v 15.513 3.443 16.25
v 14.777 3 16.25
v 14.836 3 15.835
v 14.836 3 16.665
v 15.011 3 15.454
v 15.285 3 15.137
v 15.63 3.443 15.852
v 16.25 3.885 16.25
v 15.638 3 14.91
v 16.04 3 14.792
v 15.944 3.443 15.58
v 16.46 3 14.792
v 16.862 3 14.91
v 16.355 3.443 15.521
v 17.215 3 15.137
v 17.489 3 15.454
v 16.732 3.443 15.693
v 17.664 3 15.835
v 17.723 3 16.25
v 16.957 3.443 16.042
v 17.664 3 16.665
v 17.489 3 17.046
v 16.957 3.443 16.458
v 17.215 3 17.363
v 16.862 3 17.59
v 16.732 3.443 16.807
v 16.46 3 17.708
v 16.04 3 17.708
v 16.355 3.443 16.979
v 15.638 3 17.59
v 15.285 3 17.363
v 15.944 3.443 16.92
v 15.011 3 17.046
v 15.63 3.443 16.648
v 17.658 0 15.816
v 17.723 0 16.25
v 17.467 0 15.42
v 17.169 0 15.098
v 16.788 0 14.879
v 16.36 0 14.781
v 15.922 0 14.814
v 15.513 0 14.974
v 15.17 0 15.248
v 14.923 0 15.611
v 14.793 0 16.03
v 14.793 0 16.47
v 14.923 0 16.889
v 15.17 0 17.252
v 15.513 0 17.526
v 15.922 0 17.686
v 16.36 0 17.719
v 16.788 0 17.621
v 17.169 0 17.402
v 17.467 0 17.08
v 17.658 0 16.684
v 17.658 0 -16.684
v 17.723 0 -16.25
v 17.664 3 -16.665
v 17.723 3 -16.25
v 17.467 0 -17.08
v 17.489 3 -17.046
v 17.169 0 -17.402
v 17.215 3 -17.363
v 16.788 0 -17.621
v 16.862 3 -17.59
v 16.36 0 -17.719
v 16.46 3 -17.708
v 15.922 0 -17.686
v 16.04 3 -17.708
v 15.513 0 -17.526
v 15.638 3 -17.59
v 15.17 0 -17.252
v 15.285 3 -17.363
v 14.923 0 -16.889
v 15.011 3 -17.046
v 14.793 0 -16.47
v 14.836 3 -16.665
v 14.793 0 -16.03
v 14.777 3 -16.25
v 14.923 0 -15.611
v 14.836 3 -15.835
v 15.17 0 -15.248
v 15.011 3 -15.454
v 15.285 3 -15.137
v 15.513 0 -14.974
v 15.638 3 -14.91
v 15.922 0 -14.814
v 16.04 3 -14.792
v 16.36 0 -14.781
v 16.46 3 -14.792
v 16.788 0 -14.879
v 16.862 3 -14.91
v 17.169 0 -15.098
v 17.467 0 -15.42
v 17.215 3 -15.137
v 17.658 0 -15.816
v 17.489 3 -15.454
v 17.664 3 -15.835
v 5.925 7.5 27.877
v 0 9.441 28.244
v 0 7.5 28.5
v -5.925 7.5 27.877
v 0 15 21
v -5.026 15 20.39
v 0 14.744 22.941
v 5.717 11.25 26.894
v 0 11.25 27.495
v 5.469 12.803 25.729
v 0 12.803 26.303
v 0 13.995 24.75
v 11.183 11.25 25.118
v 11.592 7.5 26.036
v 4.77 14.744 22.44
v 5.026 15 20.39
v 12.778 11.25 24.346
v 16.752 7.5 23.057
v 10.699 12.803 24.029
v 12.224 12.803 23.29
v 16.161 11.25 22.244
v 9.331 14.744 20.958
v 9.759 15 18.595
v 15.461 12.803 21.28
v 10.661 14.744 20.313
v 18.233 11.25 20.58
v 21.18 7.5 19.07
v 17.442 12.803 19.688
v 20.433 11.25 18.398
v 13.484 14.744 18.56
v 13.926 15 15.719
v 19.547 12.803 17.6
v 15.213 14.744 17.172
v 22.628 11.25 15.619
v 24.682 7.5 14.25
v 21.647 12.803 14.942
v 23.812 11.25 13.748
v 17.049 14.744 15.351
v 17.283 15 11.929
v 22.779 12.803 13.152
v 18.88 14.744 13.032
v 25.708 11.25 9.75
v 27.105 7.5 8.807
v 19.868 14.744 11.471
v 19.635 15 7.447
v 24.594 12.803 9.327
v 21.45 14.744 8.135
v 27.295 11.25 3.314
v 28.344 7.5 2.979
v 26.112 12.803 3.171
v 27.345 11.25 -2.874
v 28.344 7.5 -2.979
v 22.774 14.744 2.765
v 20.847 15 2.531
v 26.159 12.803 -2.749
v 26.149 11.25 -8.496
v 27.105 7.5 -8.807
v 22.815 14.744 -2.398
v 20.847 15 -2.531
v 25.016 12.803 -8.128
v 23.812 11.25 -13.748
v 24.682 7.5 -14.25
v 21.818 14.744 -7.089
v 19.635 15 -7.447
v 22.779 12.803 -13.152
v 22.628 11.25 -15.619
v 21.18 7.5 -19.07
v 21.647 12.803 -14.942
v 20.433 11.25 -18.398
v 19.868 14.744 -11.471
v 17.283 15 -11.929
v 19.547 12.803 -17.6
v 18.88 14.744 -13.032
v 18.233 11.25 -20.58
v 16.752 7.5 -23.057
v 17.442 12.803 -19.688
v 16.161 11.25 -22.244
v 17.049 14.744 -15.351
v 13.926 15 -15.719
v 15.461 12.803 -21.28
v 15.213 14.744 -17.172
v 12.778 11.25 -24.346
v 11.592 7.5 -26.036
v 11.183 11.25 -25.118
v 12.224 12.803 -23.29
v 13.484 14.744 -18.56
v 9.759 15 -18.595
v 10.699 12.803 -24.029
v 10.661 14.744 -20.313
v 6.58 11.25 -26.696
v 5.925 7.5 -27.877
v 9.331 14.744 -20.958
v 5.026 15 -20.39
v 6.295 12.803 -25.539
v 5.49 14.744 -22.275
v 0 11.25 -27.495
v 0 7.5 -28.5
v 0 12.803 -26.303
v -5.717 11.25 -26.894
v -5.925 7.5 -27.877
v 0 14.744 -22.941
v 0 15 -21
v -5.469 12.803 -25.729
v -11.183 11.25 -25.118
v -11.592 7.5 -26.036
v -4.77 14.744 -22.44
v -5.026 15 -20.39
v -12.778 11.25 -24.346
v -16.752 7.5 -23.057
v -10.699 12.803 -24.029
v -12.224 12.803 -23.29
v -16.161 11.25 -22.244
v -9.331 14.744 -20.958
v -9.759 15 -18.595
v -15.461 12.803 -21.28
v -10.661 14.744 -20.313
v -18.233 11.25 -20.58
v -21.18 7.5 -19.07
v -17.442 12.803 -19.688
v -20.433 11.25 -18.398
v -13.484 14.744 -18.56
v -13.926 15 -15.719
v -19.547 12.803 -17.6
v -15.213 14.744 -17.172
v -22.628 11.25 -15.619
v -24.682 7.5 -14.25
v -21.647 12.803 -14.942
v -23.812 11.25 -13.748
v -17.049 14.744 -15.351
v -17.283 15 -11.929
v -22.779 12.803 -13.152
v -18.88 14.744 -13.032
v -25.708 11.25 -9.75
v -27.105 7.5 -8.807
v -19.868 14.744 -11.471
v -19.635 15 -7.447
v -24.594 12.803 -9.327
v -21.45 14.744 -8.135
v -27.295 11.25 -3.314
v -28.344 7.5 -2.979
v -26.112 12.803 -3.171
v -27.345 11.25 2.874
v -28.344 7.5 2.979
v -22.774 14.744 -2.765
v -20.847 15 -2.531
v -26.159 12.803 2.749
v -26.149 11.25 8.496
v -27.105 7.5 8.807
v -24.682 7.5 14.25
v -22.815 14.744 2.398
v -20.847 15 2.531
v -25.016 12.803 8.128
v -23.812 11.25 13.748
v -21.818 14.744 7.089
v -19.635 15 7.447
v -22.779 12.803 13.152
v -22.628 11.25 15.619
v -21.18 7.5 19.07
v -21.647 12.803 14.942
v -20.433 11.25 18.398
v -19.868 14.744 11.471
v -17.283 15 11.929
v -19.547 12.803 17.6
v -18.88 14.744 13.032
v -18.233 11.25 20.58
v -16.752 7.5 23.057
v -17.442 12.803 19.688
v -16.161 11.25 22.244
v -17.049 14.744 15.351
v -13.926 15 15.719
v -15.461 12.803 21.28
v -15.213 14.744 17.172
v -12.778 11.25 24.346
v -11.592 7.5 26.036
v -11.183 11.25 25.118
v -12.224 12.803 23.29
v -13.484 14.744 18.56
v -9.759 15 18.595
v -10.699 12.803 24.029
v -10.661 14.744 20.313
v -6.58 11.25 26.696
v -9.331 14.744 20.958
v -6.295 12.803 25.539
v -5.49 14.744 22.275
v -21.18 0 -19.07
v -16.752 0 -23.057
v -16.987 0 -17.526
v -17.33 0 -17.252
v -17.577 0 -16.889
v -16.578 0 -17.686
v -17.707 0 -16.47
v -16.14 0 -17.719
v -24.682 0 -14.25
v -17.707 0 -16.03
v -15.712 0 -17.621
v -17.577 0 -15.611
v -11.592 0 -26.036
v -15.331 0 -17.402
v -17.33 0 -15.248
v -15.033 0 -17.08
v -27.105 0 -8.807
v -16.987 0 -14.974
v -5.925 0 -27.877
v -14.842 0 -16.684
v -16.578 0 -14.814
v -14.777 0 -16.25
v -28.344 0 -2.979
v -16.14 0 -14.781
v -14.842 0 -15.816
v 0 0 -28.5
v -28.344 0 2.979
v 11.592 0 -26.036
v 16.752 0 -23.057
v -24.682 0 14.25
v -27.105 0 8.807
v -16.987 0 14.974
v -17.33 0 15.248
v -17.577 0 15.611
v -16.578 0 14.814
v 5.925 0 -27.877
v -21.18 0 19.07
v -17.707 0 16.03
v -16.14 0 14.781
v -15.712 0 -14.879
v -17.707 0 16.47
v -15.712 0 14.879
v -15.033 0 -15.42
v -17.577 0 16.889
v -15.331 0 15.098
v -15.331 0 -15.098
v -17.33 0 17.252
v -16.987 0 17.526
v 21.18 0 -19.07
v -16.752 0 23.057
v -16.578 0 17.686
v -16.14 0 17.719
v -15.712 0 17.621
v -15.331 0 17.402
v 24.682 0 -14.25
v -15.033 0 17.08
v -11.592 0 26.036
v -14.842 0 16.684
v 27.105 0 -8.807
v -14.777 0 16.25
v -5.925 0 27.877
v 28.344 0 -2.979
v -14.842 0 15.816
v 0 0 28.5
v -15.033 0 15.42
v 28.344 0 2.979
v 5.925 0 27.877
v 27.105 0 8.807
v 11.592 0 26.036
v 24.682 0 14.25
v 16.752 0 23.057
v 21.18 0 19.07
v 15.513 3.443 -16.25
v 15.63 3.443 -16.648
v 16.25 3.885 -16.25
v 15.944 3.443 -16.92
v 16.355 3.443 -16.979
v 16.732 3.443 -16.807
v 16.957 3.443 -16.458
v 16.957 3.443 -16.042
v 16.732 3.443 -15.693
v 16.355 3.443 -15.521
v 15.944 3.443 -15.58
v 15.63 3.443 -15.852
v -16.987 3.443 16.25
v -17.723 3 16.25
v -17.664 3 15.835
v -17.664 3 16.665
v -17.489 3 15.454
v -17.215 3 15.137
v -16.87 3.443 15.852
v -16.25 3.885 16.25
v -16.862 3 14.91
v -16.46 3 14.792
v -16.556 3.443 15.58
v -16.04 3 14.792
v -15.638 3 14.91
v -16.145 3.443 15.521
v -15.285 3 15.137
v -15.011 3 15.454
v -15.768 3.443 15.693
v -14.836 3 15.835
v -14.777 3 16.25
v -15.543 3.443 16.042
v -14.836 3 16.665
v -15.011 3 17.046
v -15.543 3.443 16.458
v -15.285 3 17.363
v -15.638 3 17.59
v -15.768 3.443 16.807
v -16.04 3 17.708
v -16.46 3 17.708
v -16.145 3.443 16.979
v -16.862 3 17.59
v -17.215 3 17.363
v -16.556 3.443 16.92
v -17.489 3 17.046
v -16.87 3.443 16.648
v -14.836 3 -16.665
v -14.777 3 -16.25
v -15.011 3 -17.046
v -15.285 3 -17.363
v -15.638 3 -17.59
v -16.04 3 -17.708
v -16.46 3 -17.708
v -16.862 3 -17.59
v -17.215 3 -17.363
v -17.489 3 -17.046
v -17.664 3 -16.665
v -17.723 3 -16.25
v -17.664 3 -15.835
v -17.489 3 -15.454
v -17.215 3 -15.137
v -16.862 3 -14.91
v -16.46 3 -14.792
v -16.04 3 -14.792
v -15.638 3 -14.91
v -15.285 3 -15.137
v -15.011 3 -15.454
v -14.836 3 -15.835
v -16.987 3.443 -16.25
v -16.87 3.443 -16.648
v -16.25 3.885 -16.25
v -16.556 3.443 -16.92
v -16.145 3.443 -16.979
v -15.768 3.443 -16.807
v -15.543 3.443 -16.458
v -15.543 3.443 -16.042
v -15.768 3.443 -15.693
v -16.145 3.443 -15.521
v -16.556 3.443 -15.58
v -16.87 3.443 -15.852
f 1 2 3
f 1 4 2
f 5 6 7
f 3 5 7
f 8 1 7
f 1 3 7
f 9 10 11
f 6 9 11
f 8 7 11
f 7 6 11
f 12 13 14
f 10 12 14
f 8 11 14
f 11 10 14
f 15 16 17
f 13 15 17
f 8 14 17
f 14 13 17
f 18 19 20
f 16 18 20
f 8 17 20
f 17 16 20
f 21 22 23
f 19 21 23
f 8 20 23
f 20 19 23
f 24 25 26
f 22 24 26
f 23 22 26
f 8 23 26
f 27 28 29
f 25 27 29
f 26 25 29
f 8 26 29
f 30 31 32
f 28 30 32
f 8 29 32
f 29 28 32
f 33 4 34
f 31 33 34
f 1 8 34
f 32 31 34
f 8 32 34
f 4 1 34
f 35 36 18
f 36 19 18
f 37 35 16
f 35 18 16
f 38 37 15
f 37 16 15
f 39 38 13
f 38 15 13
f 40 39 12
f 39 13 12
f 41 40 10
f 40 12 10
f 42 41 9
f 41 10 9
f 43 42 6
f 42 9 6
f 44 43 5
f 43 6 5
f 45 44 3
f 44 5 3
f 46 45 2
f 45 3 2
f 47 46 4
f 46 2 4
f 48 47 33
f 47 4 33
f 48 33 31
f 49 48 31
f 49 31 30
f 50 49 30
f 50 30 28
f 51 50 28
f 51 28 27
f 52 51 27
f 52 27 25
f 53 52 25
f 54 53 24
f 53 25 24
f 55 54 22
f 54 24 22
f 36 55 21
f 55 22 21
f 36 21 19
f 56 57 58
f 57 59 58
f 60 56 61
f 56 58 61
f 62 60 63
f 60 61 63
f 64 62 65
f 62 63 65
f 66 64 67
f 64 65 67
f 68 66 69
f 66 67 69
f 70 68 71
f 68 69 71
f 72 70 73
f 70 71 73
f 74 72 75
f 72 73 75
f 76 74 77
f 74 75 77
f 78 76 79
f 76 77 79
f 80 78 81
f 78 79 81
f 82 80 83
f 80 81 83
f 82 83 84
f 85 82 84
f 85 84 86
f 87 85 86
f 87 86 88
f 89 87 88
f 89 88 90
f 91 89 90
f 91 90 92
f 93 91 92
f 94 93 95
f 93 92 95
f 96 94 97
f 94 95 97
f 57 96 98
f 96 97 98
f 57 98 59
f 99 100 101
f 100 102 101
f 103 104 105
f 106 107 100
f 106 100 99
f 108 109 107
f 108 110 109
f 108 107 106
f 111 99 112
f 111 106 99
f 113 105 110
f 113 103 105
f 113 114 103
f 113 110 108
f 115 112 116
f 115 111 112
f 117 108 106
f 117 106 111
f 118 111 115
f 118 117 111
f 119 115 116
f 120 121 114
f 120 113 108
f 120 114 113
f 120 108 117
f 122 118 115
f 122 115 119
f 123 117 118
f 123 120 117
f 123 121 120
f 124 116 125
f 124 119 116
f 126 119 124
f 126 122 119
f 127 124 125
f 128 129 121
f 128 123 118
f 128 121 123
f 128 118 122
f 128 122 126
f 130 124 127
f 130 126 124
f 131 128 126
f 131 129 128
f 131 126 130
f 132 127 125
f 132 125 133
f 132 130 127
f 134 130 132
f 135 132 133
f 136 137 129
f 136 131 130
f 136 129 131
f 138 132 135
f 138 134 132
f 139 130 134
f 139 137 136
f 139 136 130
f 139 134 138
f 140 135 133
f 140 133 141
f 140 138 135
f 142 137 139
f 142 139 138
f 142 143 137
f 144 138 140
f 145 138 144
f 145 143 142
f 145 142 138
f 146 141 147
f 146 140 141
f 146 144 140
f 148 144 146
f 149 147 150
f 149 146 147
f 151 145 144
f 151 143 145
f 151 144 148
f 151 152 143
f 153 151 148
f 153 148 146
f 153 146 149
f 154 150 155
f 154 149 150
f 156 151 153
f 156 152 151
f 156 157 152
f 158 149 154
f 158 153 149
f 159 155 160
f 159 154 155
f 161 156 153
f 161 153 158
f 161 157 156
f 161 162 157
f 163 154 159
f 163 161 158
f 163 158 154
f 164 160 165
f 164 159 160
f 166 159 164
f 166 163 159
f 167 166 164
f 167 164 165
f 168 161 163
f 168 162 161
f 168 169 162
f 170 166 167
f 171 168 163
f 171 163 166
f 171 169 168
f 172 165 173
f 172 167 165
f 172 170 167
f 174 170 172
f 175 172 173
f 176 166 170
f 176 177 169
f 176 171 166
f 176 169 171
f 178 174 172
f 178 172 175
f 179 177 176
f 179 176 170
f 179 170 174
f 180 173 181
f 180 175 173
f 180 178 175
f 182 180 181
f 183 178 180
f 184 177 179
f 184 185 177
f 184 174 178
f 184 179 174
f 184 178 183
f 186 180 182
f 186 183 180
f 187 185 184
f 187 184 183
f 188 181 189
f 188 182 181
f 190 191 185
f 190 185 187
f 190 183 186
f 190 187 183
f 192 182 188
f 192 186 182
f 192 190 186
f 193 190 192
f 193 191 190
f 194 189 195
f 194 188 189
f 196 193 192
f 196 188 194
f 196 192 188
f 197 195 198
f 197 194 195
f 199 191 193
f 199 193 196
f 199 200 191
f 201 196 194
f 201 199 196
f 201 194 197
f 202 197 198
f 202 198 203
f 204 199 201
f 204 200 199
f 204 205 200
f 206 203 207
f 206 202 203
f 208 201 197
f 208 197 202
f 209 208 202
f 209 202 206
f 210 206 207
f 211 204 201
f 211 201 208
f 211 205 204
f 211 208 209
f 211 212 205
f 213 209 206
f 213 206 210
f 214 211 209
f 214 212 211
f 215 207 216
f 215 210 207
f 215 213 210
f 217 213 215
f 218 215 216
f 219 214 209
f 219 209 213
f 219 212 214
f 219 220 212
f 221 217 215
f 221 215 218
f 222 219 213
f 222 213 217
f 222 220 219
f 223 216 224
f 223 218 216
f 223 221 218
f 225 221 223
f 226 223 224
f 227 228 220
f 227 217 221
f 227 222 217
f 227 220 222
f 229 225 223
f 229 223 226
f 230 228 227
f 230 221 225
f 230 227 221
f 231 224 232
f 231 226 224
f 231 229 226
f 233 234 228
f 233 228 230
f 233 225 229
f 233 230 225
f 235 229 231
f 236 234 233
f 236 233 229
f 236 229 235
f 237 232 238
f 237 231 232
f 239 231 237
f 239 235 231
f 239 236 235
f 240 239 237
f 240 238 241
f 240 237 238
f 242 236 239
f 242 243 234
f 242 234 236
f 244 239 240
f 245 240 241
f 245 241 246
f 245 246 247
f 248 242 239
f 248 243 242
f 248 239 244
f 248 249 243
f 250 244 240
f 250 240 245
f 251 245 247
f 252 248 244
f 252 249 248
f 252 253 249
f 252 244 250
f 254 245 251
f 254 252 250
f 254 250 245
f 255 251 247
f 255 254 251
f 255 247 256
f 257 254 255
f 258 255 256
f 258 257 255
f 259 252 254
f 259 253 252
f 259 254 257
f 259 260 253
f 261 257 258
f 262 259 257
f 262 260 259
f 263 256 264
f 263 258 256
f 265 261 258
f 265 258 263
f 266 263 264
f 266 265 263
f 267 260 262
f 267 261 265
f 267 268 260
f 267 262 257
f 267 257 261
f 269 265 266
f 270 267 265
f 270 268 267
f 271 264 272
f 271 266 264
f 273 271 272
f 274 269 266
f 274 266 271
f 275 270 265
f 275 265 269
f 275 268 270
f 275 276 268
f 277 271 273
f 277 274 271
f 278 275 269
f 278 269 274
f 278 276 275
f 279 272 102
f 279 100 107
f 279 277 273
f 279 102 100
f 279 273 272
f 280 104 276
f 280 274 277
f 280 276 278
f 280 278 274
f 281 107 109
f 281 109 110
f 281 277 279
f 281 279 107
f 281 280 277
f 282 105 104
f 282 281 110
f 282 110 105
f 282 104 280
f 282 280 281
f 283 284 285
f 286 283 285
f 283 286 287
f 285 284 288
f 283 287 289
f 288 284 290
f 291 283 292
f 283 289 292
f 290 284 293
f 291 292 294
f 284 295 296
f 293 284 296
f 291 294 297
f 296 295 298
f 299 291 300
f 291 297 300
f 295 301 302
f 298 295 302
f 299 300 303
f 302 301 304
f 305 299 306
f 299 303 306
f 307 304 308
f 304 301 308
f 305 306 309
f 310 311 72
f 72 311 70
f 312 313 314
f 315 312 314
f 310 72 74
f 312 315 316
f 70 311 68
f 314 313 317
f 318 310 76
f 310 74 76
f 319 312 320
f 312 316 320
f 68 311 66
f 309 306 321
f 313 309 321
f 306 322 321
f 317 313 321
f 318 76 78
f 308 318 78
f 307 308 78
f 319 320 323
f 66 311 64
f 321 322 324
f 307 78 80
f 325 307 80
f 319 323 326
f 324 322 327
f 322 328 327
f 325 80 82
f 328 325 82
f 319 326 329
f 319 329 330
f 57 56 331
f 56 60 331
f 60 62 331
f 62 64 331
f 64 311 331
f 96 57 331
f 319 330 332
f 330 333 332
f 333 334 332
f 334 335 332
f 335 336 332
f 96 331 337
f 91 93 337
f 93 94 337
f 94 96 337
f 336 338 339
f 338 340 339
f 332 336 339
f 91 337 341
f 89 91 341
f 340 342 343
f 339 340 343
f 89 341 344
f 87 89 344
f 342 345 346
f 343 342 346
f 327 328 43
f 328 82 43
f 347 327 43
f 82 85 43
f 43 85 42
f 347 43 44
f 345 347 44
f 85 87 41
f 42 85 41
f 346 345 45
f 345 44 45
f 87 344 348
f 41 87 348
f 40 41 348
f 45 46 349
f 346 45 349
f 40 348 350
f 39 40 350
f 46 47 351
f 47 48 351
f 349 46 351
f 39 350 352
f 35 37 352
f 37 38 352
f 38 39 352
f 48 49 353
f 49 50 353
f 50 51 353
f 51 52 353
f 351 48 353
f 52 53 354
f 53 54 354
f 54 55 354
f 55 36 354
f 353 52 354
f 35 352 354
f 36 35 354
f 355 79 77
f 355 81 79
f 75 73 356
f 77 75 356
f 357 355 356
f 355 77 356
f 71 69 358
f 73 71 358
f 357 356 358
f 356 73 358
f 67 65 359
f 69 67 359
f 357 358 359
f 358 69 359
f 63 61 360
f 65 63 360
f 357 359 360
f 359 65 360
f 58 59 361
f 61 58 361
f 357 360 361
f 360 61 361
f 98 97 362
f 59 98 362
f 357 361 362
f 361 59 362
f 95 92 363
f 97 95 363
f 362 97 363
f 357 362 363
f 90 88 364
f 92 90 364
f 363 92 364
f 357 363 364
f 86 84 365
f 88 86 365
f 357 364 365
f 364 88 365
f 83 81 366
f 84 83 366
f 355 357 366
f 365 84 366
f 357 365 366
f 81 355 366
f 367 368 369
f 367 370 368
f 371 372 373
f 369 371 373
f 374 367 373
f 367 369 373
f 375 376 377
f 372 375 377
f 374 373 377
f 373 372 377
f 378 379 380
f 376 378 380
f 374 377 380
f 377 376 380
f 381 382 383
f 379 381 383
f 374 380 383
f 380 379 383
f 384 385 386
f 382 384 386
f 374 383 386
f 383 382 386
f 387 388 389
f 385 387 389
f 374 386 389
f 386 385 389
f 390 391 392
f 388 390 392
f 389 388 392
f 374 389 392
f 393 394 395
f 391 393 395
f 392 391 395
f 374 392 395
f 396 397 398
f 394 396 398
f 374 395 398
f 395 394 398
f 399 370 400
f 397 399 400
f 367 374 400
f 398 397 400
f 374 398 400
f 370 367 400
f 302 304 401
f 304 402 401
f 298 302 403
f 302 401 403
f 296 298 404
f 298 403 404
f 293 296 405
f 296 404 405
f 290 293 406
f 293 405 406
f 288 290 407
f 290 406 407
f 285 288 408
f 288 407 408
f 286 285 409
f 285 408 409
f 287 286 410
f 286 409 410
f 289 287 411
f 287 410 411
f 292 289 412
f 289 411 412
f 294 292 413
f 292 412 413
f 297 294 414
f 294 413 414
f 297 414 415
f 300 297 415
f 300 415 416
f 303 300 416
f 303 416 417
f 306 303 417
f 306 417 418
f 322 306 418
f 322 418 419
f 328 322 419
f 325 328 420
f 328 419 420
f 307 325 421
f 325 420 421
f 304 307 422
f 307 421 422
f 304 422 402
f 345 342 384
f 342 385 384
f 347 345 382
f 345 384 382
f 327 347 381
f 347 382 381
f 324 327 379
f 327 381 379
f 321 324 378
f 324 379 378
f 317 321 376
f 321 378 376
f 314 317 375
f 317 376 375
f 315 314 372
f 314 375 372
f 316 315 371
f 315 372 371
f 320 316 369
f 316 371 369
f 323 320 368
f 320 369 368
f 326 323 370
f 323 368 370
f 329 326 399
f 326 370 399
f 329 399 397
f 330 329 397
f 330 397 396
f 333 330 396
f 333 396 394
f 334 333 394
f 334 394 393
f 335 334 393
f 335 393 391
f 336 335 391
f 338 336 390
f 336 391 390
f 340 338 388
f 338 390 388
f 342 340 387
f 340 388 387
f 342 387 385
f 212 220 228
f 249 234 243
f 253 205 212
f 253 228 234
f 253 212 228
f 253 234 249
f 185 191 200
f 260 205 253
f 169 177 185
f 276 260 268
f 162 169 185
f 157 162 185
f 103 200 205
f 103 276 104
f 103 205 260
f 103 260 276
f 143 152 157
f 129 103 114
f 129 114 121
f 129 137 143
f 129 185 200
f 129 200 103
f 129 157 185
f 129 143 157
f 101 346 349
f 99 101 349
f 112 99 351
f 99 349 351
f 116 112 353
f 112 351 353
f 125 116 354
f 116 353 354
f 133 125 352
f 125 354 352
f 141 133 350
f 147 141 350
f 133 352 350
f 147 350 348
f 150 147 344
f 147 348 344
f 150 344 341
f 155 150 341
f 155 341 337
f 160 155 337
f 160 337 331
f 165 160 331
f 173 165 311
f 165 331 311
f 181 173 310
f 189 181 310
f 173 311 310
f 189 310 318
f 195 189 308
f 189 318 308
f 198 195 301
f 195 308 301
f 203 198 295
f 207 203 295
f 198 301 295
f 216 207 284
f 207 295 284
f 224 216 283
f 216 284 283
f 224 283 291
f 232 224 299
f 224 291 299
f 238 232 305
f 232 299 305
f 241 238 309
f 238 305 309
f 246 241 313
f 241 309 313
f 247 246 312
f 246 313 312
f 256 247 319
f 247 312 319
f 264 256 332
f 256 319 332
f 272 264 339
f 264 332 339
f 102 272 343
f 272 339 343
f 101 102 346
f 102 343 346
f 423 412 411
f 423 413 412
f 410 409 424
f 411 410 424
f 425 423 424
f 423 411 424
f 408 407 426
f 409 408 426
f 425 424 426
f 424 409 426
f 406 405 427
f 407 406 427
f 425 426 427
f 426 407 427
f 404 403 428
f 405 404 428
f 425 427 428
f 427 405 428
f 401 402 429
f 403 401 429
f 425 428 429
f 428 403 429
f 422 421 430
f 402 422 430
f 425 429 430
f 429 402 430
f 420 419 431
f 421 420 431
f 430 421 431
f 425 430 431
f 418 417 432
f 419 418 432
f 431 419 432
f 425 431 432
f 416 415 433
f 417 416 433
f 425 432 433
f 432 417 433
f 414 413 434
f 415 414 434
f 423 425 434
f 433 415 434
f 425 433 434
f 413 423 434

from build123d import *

# Parameters (mm, degrees)
SKETCH1_R                       = 28.5
BOSS_EXTRUDE1_DEPTH             = 15
FILLET1_R                       = 7.5
F_32_0_116_DIAMETER_HOLE4_D     = 2.9464
F_32_0_116_DIAMETER_HOLE4_DEPTH = 3
F_32_0_116_DIAMETER_HOLE4_TIP   = 0.885187864


with BuildPart() as part:
    # Sketch1 → Boss-Extrude1 (new body)
    with BuildSketch(Plane(origin=(0, 0, 0), x_dir=(1, 0, 0), z_dir=(0, 1, 0))):
        with Locations(Location((0, 0, 0), (0, 0, 270))):
            Circle(SKETCH1_R)
    extrude(amount=BOSS_EXTRUDE1_DEPTH)

    # Fillet1
    fillet1_edges = [part.edges().sort_by_distance(p)[0] for p in [
        (0, 15, -28.5),
    ]]
    fillet(fillet1_edges, radius=FILLET1_R)

    # #32 (0.116) Diameter Hole4
    with Locations(Plane(origin=(0, 0, 0), x_dir=(-1, 0, 0), z_dir=(0, -1, 0))):
        with Locations((-16.25, 16.25), (16.25, 16.25), (16.25, -16.25), (-16.25, -16.25)):
            Hole(F_32_0_116_DIAMETER_HOLE4_D / 2, depth=F_32_0_116_DIAMETER_HOLE4_DEPTH)
            with Locations((0, 0, -(F_32_0_116_DIAMETER_HOLE4_DEPTH + F_32_0_116_DIAMETER_HOLE4_TIP / 2))):  # 118° drill point
                Cone(0, F_32_0_116_DIAMETER_HOLE4_D / 2, F_32_0_116_DIAMETER_HOLE4_TIP, mode=Mode.SUBTRACT)


solid = part.part
